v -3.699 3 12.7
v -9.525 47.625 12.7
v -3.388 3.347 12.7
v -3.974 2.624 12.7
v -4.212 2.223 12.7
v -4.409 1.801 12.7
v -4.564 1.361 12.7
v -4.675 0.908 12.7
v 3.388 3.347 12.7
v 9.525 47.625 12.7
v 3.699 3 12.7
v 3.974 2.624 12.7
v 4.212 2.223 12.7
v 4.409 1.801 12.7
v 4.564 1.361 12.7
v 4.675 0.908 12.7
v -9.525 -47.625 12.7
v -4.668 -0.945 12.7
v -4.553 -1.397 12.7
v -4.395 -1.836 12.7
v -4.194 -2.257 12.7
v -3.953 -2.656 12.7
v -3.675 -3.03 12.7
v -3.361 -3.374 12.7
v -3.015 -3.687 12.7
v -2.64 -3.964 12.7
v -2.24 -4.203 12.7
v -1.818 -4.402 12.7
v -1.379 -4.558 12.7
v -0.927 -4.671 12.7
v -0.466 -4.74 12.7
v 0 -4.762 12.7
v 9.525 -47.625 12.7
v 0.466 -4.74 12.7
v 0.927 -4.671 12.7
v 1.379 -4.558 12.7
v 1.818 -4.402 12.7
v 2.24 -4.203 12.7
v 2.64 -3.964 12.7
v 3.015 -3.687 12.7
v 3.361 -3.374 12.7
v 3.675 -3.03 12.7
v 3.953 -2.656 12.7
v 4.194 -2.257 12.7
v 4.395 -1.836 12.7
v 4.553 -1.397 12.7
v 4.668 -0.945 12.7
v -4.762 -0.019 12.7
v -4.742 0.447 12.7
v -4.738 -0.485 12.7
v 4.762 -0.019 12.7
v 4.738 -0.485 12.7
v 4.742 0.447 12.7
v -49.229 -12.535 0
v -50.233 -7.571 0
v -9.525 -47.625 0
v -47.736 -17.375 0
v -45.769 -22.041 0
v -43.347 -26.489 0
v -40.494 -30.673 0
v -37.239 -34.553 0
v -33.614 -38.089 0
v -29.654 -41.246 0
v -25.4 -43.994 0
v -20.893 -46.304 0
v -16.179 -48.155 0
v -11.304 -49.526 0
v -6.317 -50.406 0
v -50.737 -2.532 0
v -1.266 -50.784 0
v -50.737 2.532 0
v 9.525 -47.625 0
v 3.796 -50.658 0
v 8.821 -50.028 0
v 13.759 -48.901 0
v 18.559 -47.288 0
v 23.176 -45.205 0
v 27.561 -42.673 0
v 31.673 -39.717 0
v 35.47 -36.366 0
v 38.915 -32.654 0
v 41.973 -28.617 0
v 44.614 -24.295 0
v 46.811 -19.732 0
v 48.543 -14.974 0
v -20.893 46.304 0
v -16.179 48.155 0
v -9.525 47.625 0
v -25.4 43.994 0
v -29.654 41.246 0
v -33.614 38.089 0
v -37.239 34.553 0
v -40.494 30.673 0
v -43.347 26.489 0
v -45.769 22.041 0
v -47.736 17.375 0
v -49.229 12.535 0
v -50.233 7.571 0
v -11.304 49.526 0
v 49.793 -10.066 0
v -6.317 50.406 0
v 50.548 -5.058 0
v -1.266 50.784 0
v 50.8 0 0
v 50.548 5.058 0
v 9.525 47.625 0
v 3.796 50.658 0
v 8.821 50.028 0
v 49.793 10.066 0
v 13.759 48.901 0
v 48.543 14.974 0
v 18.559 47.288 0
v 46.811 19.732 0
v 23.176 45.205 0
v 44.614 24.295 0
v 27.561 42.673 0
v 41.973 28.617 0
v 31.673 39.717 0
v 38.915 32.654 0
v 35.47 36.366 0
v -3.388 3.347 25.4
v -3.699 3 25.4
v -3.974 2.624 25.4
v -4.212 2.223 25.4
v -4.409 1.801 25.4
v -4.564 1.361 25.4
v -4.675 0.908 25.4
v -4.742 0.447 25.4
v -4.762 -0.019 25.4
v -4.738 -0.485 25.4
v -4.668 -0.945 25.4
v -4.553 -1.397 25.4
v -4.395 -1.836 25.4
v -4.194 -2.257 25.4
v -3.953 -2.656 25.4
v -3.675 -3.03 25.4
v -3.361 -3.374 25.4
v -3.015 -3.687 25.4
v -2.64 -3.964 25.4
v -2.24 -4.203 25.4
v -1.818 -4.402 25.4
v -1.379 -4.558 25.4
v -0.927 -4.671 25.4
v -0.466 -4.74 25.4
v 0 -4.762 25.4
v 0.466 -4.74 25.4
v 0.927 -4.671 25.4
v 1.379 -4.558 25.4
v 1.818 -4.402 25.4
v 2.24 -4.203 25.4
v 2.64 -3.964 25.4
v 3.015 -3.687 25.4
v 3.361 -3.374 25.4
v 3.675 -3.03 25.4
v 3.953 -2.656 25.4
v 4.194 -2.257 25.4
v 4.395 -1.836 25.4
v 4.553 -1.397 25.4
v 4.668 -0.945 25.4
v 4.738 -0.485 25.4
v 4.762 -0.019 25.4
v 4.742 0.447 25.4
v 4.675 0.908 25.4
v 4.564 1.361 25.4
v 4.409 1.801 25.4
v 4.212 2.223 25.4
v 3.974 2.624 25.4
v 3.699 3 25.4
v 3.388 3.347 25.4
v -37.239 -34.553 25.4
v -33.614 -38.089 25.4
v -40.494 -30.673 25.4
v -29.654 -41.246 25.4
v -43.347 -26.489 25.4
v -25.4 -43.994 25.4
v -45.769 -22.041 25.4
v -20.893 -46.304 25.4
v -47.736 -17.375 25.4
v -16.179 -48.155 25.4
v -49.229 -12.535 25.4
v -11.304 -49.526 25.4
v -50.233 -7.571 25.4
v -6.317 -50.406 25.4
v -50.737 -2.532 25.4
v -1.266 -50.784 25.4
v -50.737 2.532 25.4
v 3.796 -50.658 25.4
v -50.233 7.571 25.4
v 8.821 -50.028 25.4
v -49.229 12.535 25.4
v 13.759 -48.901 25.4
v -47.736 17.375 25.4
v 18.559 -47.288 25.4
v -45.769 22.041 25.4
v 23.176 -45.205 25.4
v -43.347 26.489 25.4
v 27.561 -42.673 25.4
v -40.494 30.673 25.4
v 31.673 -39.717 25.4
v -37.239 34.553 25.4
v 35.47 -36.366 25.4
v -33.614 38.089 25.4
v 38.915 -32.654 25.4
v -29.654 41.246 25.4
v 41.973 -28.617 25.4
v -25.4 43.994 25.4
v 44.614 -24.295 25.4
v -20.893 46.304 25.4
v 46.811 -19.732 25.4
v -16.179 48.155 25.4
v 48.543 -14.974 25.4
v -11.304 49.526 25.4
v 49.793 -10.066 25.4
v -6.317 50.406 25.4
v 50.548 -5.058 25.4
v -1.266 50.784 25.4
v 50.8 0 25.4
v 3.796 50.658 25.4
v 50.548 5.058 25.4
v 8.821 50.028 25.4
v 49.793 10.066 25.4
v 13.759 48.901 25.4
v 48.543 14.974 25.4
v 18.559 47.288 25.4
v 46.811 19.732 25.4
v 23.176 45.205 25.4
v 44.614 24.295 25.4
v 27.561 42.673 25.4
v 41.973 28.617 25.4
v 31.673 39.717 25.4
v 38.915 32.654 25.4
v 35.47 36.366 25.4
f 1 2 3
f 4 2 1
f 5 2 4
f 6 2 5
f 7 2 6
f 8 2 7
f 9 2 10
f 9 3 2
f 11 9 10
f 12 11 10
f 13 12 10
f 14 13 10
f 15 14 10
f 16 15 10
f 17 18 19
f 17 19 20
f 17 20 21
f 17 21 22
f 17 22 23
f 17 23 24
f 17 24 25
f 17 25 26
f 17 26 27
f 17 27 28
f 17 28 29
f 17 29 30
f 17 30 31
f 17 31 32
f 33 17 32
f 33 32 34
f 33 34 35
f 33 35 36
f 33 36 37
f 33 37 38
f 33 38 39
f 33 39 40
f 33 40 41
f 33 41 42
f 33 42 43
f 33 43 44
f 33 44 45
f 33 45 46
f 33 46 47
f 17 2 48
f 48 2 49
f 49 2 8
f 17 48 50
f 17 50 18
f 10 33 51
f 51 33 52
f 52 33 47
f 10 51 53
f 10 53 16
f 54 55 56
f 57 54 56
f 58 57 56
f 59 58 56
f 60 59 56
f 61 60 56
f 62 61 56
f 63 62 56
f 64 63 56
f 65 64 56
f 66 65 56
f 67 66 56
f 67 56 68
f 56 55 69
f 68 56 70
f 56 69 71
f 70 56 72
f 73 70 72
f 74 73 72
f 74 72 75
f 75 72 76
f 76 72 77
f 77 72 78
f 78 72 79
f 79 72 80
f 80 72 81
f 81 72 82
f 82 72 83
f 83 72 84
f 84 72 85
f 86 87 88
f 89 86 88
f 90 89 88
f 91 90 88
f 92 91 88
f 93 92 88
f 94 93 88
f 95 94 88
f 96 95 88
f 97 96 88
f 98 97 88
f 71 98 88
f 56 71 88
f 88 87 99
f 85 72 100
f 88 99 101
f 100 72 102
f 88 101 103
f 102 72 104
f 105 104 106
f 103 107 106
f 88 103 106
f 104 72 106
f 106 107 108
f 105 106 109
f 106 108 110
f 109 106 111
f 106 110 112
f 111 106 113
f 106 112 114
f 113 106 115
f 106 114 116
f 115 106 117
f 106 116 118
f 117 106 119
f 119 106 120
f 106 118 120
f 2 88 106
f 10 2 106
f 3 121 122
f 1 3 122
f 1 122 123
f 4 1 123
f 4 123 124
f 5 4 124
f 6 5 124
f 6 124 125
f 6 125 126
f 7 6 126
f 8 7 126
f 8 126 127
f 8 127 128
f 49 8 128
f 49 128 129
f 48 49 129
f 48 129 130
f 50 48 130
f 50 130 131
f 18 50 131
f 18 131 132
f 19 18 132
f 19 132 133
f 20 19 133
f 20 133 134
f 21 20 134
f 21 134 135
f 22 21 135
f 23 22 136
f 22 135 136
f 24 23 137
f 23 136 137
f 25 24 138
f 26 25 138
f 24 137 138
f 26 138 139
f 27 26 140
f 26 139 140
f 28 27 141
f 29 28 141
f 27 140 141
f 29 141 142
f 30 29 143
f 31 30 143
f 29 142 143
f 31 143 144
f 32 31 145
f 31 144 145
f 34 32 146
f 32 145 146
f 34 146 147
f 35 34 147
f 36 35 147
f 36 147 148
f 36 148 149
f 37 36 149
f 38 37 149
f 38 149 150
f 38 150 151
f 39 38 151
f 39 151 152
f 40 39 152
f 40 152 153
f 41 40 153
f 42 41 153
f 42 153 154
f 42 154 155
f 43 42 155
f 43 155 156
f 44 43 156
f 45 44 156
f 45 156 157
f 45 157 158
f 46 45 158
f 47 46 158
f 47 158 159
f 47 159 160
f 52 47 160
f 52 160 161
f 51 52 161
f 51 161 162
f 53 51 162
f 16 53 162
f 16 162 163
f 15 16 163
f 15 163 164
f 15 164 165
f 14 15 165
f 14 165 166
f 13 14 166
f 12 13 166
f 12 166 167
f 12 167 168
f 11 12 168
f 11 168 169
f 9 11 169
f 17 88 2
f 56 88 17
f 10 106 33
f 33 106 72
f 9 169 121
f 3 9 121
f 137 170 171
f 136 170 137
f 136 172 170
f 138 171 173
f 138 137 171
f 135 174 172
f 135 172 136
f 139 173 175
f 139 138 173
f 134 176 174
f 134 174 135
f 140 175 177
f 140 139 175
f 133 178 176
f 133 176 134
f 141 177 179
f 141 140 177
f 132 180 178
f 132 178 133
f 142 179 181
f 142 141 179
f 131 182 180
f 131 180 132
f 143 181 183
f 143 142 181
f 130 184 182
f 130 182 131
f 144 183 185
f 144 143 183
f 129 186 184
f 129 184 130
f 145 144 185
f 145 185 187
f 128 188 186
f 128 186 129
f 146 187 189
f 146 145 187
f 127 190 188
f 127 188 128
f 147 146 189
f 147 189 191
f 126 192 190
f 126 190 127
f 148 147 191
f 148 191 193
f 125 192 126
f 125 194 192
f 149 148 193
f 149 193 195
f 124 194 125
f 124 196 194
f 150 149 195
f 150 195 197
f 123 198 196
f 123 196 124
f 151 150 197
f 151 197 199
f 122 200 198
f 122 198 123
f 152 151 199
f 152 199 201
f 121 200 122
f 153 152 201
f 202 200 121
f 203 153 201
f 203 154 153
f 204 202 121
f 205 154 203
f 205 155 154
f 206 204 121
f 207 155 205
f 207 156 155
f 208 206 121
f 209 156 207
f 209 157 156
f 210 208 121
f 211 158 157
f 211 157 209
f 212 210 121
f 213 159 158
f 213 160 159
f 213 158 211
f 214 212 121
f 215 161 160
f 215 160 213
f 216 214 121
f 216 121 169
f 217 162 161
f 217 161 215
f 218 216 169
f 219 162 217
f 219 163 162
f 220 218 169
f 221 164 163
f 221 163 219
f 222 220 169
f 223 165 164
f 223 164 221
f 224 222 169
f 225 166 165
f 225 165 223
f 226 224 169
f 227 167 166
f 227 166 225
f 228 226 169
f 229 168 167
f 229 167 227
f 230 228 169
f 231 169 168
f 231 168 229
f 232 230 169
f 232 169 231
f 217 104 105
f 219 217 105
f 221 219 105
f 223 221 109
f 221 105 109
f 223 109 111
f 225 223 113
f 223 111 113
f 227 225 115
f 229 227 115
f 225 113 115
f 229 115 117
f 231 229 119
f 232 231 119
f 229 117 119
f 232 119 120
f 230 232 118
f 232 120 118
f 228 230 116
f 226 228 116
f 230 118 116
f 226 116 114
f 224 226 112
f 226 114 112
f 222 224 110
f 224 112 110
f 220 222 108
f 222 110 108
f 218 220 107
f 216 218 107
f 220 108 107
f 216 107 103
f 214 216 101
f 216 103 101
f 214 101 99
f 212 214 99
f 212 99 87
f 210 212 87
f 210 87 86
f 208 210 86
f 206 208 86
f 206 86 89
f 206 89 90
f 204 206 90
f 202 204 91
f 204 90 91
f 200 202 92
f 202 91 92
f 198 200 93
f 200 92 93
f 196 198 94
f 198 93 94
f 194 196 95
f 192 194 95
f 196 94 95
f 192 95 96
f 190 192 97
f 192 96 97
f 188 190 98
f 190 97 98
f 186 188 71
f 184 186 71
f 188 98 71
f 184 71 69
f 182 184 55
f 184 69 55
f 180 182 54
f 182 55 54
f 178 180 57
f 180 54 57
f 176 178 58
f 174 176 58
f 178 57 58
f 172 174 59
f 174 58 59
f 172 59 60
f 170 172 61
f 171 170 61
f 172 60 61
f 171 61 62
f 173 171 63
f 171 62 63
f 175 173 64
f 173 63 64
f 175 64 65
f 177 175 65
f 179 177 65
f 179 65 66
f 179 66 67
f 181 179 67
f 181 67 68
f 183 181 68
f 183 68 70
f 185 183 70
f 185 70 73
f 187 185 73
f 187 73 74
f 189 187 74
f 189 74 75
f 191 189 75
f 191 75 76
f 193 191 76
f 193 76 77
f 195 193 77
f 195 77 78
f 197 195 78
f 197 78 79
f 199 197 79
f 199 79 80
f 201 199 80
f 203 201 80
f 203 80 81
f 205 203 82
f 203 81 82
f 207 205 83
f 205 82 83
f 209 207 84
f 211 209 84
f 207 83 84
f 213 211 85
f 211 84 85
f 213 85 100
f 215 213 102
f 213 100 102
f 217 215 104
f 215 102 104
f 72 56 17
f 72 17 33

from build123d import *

# Parameters (mm, degrees)
F0_R     = 50.8
F1_DEPTH = 25.4
F2_W     = 19.05
F2_H     = 95.25
F3_DEPTH = 12.7
F5_DEPTH = 25.4


with BuildPart() as f1:
    # F0 (on Top) → F1 (new body)
    with BuildSketch(Plane.XY):
        Circle(F0_R)
    extrude(amount=F1_DEPTH)

    # F2 (on face) → F3 (cut)
    with BuildSketch(Plane(origin=(0, 0, 0), x_dir=(1, 0, 0), z_dir=(0, 0, -1))):
        Rectangle(F2_W, F2_H)
    extrude(amount=-F3_DEPTH, mode=Mode.SUBTRACT)

    # F4 (on face) → F5 (cut)
    with BuildSketch(Plane.XY.offset(25.4)):
        with BuildLine():
            Line((3.387666, 3.347405), (-3.387666, 3.347405))
            ThreePointArc((-3.387666, 3.347405), (0, -4.7625), (3.387666, 3.347405))
        make_face()
    extrude(amount=-F5_DEPTH, mode=Mode.SUBTRACT)


solid = f1.part
